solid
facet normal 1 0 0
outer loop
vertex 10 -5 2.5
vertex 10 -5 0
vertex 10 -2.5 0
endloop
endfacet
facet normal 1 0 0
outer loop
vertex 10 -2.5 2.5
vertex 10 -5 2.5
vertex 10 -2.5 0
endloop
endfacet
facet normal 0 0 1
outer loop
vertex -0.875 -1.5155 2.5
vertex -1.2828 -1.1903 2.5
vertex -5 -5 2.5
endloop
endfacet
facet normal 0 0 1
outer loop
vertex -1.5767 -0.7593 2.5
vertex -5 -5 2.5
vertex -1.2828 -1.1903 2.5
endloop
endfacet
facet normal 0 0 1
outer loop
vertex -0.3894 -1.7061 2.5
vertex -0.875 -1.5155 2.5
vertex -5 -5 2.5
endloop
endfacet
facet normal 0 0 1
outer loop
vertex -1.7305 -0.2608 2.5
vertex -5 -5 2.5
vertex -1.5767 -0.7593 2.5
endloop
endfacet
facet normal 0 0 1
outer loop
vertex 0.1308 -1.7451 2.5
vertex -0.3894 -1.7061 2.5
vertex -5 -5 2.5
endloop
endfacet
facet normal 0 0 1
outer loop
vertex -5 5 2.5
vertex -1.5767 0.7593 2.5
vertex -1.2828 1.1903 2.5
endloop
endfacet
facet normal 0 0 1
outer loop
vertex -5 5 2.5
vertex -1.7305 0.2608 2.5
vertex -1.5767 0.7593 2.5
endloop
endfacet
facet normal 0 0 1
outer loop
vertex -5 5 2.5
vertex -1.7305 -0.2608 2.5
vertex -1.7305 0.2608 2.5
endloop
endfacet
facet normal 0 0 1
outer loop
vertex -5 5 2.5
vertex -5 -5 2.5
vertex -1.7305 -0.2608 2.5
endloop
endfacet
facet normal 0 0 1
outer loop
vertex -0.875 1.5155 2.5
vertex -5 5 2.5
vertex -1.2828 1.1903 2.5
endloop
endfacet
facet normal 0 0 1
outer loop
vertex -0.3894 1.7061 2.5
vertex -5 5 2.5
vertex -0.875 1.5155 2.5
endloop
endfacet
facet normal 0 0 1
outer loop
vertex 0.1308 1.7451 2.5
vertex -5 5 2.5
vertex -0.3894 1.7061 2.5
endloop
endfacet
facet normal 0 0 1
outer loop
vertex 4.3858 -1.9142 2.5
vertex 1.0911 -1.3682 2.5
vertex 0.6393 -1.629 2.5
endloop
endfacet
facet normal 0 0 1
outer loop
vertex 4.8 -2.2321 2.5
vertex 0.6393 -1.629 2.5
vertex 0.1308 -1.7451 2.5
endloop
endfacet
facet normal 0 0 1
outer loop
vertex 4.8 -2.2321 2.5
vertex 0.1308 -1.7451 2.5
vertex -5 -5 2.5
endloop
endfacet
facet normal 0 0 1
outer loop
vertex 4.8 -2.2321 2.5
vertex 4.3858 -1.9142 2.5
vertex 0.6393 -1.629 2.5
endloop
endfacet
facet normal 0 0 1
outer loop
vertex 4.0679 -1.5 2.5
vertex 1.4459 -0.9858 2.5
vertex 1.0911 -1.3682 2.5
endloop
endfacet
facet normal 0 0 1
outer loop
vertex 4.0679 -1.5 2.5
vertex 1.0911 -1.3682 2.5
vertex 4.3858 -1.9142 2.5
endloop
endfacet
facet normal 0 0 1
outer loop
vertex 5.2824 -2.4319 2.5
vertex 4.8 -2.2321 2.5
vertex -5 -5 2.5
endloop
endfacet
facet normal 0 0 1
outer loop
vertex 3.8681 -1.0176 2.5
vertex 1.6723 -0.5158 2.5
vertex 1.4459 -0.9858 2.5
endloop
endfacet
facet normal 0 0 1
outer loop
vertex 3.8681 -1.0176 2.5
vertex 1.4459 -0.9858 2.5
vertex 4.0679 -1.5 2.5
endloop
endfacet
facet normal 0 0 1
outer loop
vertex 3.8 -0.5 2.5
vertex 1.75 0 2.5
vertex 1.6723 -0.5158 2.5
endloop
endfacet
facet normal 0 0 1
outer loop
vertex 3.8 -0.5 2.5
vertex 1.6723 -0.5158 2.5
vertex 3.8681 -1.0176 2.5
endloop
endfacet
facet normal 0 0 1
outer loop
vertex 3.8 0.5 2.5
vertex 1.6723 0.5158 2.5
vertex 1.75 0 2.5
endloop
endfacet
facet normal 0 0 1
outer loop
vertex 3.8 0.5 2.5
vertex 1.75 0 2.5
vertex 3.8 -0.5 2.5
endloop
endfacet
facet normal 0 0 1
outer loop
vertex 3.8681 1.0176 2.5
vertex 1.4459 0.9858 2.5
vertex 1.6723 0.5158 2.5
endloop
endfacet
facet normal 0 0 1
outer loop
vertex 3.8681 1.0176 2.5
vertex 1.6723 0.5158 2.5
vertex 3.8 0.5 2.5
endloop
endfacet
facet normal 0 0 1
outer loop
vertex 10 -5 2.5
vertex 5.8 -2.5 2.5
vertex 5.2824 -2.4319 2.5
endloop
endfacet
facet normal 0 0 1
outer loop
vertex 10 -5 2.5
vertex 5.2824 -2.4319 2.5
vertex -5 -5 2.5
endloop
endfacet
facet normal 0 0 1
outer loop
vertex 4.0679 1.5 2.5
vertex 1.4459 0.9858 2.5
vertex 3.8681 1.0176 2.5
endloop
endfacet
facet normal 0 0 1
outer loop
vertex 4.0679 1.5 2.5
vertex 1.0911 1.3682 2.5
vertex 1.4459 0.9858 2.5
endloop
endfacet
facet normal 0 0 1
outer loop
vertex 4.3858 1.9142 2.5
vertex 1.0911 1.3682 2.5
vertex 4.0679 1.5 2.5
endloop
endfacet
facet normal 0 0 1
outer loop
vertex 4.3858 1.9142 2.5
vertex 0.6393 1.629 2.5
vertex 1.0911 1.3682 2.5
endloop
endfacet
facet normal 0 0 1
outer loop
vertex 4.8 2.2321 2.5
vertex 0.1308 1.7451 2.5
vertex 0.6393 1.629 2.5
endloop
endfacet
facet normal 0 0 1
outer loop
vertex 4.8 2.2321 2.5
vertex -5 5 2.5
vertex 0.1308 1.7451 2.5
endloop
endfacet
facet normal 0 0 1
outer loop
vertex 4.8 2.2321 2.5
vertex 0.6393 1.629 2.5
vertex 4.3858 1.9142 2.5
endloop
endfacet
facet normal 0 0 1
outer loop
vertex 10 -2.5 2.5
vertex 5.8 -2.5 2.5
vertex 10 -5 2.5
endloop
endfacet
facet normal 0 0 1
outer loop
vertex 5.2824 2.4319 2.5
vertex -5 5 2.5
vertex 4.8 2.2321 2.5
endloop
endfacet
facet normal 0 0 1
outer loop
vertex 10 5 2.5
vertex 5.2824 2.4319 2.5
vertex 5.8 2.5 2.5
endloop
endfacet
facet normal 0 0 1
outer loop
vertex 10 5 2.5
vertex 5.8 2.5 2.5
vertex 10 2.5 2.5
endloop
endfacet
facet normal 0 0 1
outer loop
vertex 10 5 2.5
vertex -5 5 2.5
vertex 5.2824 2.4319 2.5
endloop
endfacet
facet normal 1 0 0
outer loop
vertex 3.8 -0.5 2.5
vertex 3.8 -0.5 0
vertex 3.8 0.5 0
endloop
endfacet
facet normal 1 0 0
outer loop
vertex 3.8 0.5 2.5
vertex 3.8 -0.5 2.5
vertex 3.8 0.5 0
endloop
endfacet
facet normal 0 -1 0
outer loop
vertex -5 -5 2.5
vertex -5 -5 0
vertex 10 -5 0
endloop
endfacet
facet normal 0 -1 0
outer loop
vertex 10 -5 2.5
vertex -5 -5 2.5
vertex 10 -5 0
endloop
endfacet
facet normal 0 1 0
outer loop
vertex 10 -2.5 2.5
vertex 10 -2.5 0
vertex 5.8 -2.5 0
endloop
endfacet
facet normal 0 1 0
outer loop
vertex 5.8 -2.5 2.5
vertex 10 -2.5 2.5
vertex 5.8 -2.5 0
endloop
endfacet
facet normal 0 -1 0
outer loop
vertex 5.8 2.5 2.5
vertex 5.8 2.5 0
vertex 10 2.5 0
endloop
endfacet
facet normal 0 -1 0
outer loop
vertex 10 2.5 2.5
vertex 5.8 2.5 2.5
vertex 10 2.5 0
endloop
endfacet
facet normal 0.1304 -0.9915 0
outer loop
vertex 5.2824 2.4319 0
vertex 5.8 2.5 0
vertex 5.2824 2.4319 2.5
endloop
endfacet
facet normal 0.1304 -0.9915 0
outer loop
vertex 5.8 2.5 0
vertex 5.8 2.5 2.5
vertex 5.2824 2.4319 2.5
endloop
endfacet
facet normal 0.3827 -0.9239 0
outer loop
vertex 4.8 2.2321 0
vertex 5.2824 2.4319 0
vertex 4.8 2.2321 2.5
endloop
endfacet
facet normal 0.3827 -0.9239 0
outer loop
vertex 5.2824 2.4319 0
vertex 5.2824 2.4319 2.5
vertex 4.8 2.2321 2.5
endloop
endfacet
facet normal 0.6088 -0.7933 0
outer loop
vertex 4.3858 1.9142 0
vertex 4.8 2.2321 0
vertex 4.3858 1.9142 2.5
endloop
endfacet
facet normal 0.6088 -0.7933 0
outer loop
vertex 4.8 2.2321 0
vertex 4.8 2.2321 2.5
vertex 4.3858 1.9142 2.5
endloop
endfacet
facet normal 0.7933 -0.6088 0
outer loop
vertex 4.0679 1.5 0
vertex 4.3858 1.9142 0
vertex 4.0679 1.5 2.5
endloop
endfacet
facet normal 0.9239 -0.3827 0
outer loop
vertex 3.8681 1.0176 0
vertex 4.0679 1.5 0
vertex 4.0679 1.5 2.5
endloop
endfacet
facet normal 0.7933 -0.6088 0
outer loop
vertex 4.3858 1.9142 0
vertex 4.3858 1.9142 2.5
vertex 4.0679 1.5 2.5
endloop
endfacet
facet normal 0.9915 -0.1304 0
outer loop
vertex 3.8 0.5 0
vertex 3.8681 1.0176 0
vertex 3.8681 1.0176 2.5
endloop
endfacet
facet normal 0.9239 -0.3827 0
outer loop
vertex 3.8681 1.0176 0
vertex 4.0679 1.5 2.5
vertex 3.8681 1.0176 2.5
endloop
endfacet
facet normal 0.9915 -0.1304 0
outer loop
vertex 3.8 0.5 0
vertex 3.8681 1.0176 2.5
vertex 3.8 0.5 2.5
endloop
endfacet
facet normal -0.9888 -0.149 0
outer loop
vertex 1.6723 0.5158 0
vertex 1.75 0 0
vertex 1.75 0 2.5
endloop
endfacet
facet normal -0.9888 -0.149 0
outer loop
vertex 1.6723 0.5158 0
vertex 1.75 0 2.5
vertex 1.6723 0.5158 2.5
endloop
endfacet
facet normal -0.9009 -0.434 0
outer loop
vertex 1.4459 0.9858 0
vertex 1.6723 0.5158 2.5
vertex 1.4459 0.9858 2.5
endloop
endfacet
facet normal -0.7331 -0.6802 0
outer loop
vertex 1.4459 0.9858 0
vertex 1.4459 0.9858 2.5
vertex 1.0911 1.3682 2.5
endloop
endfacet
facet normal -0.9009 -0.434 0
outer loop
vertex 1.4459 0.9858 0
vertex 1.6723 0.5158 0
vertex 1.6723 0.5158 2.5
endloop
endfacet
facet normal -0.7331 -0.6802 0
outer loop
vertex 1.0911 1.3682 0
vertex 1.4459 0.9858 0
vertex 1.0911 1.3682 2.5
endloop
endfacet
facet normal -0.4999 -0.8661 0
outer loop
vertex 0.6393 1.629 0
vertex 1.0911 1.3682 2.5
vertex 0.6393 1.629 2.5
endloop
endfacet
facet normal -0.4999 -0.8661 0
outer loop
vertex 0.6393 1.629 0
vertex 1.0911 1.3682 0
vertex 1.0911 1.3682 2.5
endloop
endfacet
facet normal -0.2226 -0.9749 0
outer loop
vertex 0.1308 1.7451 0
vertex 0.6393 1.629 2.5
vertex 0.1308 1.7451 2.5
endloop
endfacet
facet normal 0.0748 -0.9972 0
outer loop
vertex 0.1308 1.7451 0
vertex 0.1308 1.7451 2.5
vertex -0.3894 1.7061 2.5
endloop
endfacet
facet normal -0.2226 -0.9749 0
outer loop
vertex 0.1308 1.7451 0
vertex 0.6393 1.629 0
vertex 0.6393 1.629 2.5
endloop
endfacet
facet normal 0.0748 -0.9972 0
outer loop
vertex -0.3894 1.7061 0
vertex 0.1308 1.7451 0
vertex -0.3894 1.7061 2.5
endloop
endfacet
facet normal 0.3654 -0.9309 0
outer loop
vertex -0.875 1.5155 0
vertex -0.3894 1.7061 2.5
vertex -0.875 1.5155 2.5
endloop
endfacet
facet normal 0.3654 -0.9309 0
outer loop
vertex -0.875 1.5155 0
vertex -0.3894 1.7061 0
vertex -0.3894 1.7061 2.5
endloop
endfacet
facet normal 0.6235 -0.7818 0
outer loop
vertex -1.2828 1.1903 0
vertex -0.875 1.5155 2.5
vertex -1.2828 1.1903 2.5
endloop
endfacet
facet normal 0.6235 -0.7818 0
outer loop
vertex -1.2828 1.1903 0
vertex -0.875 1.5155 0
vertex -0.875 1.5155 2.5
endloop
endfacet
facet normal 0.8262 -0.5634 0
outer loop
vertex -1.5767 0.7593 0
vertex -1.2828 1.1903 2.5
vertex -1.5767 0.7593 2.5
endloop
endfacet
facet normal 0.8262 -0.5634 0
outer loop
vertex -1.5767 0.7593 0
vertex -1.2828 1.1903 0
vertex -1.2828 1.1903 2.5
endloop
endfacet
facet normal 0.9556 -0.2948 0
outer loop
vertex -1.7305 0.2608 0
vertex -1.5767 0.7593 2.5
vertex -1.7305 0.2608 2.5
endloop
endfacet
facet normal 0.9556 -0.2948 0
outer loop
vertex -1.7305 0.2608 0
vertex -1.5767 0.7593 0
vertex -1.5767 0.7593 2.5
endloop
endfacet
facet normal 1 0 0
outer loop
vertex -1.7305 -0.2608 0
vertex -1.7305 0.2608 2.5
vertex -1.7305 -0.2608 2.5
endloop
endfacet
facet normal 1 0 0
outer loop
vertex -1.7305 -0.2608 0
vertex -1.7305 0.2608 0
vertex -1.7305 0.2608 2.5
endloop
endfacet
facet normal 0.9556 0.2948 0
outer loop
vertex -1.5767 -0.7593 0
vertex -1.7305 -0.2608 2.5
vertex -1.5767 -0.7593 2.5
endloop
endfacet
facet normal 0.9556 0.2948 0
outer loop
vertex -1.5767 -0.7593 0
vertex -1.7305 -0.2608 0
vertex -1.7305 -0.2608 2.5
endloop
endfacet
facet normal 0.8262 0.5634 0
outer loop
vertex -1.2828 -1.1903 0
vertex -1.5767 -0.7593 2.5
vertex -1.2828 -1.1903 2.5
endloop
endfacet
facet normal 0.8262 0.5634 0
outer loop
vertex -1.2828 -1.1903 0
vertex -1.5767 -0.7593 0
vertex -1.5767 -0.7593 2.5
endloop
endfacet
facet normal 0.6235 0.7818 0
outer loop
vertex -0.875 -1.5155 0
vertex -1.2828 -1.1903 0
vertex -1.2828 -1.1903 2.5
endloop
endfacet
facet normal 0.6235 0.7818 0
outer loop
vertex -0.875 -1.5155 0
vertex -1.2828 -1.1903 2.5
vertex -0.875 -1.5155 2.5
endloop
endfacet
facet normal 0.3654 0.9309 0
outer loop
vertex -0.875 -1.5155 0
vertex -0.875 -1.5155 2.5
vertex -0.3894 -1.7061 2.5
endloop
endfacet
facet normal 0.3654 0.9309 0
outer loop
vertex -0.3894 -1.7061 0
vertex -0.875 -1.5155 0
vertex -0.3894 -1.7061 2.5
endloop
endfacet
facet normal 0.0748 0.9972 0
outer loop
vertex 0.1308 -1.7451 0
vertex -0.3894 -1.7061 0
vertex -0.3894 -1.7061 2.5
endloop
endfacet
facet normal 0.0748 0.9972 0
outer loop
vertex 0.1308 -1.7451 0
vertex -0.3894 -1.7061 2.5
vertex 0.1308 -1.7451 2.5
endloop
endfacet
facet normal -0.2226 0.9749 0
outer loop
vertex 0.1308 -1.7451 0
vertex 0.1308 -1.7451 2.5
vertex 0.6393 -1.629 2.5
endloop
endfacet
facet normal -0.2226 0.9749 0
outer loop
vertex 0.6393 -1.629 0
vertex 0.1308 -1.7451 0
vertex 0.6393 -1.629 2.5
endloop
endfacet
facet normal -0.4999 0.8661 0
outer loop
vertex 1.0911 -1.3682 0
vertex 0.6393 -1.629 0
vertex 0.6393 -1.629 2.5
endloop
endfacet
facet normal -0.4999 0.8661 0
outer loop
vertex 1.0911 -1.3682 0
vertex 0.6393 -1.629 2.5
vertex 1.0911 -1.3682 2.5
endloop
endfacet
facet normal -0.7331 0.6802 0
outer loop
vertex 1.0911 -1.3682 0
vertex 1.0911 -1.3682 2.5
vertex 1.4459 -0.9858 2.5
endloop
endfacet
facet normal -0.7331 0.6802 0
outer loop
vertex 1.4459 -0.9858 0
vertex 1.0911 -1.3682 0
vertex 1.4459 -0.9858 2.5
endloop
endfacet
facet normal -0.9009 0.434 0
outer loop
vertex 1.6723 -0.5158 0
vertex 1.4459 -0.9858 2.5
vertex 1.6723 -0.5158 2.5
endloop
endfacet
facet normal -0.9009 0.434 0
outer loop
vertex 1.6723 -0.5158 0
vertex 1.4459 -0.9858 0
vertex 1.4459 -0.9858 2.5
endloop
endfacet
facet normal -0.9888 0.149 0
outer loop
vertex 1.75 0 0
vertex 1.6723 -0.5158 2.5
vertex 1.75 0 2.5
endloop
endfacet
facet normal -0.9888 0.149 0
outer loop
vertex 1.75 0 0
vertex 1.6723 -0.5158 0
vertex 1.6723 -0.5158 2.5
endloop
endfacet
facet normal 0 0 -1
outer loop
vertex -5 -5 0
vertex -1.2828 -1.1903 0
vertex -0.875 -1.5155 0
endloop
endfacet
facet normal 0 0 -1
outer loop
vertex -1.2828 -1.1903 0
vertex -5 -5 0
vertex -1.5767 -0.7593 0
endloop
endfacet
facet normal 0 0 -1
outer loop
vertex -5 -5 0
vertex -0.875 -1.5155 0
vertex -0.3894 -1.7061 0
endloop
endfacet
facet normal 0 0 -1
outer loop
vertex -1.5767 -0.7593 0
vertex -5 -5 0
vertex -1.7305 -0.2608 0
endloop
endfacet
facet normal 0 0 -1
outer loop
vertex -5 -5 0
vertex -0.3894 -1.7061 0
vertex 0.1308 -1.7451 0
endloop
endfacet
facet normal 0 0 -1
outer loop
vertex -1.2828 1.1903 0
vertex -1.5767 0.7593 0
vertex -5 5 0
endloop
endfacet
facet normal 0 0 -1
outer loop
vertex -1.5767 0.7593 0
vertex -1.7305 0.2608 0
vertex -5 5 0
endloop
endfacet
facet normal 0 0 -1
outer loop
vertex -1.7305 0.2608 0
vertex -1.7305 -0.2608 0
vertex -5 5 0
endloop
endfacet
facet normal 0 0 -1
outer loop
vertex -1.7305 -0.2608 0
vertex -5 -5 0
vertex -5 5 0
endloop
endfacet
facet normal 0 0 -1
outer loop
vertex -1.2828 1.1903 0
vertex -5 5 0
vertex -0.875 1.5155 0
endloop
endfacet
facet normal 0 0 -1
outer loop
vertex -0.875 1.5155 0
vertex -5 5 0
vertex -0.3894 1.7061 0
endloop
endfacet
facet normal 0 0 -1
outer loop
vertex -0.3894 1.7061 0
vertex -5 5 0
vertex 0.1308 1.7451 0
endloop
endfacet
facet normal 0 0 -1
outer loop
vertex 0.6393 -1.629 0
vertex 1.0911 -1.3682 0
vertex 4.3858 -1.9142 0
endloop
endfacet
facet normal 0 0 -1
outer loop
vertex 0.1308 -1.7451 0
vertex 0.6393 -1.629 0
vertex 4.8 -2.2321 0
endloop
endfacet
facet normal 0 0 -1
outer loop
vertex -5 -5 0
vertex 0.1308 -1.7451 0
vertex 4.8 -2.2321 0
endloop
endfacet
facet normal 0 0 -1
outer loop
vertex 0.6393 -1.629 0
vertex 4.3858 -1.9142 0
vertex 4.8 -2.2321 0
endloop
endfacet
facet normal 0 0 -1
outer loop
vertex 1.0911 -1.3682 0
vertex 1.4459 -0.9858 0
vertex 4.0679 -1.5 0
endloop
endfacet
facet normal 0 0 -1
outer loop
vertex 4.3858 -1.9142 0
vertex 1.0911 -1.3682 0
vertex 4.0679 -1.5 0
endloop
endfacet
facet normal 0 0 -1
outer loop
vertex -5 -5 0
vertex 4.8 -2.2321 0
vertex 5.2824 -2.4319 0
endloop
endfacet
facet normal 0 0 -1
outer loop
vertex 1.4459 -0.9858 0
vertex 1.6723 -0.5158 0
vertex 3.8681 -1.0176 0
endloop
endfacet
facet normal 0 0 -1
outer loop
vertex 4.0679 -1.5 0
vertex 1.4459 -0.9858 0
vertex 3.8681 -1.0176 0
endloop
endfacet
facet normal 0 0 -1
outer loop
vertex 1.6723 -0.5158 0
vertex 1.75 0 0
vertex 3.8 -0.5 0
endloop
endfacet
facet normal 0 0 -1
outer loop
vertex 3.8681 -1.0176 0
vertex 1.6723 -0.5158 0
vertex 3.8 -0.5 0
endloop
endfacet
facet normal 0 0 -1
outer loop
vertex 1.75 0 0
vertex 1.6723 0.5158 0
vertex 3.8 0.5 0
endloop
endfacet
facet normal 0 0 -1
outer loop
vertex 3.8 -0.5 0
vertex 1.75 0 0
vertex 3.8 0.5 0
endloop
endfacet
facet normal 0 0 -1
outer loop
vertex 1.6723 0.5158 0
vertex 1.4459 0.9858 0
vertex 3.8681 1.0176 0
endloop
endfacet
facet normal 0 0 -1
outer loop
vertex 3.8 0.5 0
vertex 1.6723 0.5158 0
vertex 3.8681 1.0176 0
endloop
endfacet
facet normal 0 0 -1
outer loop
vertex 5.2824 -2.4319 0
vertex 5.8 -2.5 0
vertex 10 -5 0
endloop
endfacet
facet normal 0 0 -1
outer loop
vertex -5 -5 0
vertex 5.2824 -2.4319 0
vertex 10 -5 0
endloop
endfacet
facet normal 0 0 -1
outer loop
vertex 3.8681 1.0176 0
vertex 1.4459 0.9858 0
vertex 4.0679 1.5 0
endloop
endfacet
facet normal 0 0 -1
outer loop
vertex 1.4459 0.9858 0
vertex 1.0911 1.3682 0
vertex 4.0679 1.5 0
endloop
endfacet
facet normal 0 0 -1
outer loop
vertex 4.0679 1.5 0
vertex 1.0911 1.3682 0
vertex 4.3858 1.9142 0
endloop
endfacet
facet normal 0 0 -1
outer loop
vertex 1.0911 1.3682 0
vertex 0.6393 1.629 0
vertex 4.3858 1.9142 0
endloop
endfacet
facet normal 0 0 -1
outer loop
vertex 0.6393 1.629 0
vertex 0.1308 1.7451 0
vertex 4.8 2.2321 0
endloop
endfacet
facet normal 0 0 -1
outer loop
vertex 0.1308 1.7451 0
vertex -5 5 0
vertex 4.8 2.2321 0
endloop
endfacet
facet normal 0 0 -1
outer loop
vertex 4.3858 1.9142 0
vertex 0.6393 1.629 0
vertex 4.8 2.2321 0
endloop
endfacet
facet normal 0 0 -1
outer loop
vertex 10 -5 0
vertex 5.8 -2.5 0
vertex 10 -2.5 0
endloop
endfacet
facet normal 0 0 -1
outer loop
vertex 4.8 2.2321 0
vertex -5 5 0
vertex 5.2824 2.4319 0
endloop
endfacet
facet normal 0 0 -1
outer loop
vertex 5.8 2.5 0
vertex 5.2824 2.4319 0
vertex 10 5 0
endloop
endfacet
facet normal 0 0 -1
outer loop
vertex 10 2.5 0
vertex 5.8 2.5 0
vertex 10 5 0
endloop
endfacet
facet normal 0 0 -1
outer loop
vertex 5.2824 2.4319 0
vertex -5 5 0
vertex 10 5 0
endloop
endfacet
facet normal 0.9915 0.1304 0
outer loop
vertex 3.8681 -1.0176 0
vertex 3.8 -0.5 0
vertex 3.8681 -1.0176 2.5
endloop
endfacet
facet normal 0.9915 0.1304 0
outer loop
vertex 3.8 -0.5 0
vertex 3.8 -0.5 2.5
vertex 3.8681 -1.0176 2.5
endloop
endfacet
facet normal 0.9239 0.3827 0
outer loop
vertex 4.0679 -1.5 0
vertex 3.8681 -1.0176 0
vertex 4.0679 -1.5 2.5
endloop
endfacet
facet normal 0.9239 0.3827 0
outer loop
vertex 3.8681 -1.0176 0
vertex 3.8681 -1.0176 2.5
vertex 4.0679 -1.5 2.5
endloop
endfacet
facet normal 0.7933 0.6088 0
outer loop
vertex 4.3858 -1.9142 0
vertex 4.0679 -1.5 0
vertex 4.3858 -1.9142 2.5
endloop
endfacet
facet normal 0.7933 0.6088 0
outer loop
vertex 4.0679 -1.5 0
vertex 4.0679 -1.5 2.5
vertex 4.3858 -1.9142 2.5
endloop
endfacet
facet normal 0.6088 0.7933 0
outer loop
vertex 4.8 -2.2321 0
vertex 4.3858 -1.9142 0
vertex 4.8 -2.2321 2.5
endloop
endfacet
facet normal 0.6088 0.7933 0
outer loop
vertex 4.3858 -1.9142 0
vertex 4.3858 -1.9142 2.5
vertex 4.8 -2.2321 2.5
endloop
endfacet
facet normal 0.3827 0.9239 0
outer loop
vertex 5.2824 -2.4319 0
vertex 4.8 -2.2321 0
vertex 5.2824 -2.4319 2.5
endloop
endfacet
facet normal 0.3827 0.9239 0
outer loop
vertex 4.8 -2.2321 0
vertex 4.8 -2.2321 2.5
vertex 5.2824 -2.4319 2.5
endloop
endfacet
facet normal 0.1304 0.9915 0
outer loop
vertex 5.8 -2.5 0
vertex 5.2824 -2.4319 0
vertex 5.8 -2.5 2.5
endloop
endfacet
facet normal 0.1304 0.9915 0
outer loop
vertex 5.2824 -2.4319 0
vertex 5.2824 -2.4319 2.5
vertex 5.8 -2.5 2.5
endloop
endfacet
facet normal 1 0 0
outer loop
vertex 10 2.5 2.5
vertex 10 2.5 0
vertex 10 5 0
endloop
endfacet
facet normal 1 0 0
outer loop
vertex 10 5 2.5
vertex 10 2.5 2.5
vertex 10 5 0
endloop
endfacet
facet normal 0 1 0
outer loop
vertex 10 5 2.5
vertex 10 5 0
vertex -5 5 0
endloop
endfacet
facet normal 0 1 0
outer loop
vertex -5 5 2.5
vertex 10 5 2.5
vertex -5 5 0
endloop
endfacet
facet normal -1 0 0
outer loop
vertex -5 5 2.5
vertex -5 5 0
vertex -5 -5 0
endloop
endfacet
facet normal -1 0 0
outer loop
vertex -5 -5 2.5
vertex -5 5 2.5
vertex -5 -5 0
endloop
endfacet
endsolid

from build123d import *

# Parameters (mm, degrees)
F0_R     = 1.75
F1_DEPTH = 2.5
F2_R     = 2
F3_R     = 2


with BuildPart() as f1:
    # F0 (on Top) → F1 (new body)
    with BuildSketch(Plane.XY):
        Polygon((10, 5), (-5, 5), (-5, -5), (10, -5), (10, -2.5), (3.8, -2.5), (3.8, 2.5), (10, 2.5), align=None)
        Circle(F0_R, mode=Mode.SUBTRACT)
    extrude(amount=F1_DEPTH)

    # F2
    f2_edges = [f1.edges().sort_by_distance(p)[0] for p in [
        (3.8, 2.5, 1.25),
    ]]
    fillet(f2_edges, radius=F2_R)

    # F3
    f3_edges = [f1.edges().sort_by_distance(p)[0] for p in [
        (3.8, -2.5, 1.25),
    ]]
    fillet(f3_edges, radius=F3_R)


solid = f1.part
